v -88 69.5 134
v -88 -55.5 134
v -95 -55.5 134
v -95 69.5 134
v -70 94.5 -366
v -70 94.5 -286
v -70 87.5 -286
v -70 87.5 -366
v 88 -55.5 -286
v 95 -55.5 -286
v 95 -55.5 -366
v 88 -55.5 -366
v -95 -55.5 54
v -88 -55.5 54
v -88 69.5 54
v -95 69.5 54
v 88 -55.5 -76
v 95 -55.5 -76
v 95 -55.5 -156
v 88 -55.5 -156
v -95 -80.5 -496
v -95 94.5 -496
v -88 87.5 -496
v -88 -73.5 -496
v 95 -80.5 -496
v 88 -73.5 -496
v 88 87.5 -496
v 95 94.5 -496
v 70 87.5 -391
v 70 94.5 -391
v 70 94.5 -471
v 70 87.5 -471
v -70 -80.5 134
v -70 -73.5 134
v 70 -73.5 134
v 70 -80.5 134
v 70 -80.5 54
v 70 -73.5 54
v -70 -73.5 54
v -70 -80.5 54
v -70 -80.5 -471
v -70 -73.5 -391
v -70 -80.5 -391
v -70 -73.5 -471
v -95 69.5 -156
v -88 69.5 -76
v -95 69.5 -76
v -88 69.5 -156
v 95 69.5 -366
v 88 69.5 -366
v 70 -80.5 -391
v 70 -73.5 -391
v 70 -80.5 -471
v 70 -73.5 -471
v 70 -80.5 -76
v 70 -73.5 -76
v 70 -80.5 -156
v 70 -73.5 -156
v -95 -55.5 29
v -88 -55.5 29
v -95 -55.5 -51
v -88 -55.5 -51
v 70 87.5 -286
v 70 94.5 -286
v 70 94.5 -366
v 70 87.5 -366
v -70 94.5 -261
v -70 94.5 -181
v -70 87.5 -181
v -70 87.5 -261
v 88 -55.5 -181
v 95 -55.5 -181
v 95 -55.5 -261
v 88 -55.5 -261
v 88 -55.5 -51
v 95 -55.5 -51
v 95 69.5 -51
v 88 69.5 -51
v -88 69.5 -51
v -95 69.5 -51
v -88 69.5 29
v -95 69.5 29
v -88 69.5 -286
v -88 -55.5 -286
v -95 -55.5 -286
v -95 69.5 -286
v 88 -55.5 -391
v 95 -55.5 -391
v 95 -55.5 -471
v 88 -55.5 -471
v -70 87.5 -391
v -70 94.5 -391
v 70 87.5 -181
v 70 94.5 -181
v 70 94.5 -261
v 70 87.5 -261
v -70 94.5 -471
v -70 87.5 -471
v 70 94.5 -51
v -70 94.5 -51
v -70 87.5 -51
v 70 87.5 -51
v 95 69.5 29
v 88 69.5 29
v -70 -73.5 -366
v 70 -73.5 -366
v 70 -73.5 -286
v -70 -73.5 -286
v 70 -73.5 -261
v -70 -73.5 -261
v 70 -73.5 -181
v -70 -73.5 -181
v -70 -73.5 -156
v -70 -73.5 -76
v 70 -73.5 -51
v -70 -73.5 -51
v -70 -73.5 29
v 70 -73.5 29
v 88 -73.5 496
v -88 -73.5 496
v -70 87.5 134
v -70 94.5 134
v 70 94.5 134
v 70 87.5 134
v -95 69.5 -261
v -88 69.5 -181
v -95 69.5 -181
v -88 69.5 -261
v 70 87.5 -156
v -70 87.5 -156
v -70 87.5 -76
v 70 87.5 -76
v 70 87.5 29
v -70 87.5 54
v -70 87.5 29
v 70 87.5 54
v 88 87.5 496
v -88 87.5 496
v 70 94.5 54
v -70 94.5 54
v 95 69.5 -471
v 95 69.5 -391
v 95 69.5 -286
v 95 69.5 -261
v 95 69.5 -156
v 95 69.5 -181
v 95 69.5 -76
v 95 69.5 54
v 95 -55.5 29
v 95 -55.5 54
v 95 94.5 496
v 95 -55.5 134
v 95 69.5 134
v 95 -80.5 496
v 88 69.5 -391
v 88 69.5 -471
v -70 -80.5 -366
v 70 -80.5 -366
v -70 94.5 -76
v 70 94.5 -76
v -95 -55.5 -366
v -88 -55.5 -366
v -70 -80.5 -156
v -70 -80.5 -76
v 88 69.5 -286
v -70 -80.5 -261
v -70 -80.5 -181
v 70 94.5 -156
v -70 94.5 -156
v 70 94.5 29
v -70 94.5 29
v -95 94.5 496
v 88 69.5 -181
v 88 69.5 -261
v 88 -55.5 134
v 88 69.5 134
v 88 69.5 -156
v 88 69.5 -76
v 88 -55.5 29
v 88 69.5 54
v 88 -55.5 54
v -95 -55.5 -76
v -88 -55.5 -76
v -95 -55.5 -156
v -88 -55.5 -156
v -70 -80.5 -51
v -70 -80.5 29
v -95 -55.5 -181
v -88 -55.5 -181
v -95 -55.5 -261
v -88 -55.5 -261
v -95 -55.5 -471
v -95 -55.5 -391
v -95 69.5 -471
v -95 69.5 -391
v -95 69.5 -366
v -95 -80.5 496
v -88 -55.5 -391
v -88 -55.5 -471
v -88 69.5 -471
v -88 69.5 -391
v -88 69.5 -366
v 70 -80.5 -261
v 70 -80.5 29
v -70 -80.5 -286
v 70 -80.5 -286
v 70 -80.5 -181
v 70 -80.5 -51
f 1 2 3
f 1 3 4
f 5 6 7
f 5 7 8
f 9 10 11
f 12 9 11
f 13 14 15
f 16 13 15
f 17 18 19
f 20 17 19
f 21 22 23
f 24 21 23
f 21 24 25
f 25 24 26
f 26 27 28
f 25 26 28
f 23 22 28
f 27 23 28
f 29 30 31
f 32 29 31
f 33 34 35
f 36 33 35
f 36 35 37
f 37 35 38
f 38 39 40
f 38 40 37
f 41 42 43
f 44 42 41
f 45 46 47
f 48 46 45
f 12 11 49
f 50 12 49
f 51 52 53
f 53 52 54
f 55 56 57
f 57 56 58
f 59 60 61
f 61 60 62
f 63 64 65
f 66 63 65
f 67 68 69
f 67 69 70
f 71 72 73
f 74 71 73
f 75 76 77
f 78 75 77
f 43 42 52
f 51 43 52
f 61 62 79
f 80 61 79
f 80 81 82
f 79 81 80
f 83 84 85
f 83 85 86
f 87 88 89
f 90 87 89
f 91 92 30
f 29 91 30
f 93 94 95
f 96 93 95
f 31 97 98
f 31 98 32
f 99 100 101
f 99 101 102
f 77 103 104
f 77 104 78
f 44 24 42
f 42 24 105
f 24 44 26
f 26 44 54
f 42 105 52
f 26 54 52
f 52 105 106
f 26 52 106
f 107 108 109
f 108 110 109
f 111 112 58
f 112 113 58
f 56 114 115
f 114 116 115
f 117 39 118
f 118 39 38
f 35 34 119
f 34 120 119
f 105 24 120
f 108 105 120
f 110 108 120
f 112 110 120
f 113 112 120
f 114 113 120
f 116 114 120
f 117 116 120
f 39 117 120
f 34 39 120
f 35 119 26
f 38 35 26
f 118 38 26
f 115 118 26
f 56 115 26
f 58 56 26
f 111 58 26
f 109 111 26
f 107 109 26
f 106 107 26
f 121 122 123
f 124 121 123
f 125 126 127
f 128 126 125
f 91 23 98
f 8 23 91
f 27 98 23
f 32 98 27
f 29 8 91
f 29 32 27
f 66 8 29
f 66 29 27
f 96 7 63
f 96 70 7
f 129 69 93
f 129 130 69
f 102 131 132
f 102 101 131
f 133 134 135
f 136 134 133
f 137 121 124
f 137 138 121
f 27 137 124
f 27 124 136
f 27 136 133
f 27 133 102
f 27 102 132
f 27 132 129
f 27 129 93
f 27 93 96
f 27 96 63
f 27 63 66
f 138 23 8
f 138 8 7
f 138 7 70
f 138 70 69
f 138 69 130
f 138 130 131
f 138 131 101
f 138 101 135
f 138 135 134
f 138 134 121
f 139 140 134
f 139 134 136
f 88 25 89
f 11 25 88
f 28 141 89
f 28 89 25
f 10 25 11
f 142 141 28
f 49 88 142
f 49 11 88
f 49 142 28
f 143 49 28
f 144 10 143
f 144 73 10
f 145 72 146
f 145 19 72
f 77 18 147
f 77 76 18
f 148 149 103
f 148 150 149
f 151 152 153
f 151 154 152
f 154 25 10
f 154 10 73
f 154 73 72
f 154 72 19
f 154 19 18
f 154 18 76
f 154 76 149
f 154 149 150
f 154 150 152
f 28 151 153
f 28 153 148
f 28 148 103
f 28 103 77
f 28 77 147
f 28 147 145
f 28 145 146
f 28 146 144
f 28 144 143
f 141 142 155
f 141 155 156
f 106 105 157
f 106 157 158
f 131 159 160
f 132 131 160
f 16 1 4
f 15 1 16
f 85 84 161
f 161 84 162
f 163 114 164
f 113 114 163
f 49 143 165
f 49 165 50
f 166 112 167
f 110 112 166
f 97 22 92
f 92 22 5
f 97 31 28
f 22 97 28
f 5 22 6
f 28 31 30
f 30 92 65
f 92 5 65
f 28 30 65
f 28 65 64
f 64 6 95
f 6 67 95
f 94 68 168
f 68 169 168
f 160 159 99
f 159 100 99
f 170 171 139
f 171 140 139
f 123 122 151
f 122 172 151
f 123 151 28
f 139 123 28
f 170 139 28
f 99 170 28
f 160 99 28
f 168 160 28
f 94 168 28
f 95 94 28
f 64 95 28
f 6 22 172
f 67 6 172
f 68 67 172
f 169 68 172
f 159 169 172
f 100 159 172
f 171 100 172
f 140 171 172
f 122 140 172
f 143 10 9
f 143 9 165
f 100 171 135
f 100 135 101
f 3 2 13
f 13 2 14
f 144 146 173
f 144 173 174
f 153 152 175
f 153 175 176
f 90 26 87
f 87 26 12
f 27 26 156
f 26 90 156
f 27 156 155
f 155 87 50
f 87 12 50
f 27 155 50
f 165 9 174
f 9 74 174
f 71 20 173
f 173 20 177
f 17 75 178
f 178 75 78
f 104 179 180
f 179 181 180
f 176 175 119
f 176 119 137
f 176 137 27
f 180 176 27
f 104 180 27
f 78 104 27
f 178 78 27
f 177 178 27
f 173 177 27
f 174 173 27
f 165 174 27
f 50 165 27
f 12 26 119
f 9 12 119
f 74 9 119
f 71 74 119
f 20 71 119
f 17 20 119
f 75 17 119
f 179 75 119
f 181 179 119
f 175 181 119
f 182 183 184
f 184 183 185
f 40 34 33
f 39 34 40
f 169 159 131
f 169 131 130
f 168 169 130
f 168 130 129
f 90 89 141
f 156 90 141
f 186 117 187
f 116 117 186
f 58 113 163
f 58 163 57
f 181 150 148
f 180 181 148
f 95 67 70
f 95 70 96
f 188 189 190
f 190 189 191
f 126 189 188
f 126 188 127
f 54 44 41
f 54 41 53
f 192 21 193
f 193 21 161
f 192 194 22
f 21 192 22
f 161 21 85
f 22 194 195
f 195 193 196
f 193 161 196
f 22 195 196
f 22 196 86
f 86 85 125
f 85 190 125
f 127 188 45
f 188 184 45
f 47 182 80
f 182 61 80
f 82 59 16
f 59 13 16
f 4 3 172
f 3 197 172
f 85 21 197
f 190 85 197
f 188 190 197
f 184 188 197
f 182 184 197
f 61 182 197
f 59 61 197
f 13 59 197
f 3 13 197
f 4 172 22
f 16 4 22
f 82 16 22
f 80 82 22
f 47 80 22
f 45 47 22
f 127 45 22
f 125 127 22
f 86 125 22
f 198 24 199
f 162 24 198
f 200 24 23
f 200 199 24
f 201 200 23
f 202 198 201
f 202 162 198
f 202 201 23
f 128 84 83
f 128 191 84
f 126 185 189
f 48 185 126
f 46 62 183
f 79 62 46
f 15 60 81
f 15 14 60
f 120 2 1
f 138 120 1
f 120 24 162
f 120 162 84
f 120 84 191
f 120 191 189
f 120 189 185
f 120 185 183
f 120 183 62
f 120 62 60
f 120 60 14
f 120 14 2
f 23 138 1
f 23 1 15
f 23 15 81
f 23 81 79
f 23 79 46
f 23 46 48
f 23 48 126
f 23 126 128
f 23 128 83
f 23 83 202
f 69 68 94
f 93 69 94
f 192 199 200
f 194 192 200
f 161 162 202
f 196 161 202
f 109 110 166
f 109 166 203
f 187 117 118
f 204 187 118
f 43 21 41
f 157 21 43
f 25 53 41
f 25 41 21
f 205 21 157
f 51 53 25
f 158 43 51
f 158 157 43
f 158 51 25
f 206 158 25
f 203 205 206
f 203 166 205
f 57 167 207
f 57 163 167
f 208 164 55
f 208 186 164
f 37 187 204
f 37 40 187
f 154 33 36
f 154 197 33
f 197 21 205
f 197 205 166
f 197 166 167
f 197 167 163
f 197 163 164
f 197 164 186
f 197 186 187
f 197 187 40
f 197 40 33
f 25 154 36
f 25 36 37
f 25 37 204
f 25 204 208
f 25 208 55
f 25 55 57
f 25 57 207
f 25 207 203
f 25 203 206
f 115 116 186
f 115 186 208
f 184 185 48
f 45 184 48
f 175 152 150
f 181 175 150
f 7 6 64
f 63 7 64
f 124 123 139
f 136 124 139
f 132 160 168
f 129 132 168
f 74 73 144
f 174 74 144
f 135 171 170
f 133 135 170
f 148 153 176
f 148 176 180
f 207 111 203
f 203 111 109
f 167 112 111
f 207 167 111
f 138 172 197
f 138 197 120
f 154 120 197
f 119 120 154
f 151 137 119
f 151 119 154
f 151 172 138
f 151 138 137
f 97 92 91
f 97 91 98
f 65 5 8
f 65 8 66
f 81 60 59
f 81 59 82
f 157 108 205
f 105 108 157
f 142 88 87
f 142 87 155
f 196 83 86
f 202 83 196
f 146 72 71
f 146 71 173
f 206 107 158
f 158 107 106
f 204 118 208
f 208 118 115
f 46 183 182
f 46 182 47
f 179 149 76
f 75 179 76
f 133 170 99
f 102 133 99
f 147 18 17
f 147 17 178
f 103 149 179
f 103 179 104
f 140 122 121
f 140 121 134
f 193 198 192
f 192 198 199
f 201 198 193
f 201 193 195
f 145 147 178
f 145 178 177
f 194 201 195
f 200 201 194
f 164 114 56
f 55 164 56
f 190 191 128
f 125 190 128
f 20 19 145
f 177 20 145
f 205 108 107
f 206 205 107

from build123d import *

# Parameters (mm, degrees)
SKETCH1_W           = 190
SKETCH1_H           = 175
SKETCH1_W_2         = 176
SKETCH1_H_2         = 161
BOSS_EXTRUDE1_DEPTH = 496
SKETCH2_W           = 80
SKETCH2_H           = 125
CUT_EXTRUDE1_DEPTH  = 540.487024867
SKETCH5_W           = 140
SKETCH5_H           = 80
CUT_EXTRUDE2_DEPTH  = 535.477314766


with BuildPart() as part:
    # Sketch1 → Boss-Extrude1 (new, symmetric)
    with BuildSketch(Plane.XY):
        with Locations((0, 7)):
            Rectangle(SKETCH1_W, SKETCH1_H)
        with Locations((0, 7)):
            Rectangle(SKETCH1_W_2, SKETCH1_H_2, mode=Mode.SUBTRACT)
    extrude(amount=BOSS_EXTRUDE1_DEPTH, both=True)

    # Sketch2 → Cut-Extrude1 (cut, through all)
    with BuildSketch(Plane(origin=(95, 0, 0), x_dir=(0, 0, -1), z_dir=(1, 0, 0))):
        with Locations((431, 7)):
            Rectangle(SKETCH2_W, SKETCH2_H)
        with Locations((326, 7)):
            Rectangle(SKETCH2_W, SKETCH2_H)
        with Locations((221, 7)):
            Rectangle(SKETCH2_W, SKETCH2_H)
        with Locations((116, 7)):
            Rectangle(SKETCH2_W, SKETCH2_H)
        with Locations((11, 7)):
            Rectangle(SKETCH2_W, SKETCH2_H)
        with Locations((-94, 7)):
            Rectangle(SKETCH2_W, SKETCH2_H)
    extrude(amount=-CUT_EXTRUDE1_DEPTH, mode=Mode.SUBTRACT)

    # Sketch5 → Cut-Extrude2 (cut, through all)
    with BuildSketch(Plane(origin=(0, 94.5, 0), x_dir=(1, 0, 0), z_dir=(0, 1, 0))):
        with Locations((0, 431)):
            Rectangle(SKETCH5_W, SKETCH5_H)
        with Locations((0, 326)):
            Rectangle(SKETCH5_W, SKETCH5_H)
        with Locations((0, 221)):
            Rectangle(SKETCH5_W, SKETCH5_H)
        with Locations((0, 116)):
            Rectangle(SKETCH5_W, SKETCH5_H)
        with Locations((0, 11)):
            Rectangle(SKETCH5_W, SKETCH5_H)
        with Locations((0, -94)):
            Rectangle(SKETCH5_W, SKETCH5_H)
    extrude(amount=-CUT_EXTRUDE2_DEPTH, mode=Mode.SUBTRACT)


solid = part.part
